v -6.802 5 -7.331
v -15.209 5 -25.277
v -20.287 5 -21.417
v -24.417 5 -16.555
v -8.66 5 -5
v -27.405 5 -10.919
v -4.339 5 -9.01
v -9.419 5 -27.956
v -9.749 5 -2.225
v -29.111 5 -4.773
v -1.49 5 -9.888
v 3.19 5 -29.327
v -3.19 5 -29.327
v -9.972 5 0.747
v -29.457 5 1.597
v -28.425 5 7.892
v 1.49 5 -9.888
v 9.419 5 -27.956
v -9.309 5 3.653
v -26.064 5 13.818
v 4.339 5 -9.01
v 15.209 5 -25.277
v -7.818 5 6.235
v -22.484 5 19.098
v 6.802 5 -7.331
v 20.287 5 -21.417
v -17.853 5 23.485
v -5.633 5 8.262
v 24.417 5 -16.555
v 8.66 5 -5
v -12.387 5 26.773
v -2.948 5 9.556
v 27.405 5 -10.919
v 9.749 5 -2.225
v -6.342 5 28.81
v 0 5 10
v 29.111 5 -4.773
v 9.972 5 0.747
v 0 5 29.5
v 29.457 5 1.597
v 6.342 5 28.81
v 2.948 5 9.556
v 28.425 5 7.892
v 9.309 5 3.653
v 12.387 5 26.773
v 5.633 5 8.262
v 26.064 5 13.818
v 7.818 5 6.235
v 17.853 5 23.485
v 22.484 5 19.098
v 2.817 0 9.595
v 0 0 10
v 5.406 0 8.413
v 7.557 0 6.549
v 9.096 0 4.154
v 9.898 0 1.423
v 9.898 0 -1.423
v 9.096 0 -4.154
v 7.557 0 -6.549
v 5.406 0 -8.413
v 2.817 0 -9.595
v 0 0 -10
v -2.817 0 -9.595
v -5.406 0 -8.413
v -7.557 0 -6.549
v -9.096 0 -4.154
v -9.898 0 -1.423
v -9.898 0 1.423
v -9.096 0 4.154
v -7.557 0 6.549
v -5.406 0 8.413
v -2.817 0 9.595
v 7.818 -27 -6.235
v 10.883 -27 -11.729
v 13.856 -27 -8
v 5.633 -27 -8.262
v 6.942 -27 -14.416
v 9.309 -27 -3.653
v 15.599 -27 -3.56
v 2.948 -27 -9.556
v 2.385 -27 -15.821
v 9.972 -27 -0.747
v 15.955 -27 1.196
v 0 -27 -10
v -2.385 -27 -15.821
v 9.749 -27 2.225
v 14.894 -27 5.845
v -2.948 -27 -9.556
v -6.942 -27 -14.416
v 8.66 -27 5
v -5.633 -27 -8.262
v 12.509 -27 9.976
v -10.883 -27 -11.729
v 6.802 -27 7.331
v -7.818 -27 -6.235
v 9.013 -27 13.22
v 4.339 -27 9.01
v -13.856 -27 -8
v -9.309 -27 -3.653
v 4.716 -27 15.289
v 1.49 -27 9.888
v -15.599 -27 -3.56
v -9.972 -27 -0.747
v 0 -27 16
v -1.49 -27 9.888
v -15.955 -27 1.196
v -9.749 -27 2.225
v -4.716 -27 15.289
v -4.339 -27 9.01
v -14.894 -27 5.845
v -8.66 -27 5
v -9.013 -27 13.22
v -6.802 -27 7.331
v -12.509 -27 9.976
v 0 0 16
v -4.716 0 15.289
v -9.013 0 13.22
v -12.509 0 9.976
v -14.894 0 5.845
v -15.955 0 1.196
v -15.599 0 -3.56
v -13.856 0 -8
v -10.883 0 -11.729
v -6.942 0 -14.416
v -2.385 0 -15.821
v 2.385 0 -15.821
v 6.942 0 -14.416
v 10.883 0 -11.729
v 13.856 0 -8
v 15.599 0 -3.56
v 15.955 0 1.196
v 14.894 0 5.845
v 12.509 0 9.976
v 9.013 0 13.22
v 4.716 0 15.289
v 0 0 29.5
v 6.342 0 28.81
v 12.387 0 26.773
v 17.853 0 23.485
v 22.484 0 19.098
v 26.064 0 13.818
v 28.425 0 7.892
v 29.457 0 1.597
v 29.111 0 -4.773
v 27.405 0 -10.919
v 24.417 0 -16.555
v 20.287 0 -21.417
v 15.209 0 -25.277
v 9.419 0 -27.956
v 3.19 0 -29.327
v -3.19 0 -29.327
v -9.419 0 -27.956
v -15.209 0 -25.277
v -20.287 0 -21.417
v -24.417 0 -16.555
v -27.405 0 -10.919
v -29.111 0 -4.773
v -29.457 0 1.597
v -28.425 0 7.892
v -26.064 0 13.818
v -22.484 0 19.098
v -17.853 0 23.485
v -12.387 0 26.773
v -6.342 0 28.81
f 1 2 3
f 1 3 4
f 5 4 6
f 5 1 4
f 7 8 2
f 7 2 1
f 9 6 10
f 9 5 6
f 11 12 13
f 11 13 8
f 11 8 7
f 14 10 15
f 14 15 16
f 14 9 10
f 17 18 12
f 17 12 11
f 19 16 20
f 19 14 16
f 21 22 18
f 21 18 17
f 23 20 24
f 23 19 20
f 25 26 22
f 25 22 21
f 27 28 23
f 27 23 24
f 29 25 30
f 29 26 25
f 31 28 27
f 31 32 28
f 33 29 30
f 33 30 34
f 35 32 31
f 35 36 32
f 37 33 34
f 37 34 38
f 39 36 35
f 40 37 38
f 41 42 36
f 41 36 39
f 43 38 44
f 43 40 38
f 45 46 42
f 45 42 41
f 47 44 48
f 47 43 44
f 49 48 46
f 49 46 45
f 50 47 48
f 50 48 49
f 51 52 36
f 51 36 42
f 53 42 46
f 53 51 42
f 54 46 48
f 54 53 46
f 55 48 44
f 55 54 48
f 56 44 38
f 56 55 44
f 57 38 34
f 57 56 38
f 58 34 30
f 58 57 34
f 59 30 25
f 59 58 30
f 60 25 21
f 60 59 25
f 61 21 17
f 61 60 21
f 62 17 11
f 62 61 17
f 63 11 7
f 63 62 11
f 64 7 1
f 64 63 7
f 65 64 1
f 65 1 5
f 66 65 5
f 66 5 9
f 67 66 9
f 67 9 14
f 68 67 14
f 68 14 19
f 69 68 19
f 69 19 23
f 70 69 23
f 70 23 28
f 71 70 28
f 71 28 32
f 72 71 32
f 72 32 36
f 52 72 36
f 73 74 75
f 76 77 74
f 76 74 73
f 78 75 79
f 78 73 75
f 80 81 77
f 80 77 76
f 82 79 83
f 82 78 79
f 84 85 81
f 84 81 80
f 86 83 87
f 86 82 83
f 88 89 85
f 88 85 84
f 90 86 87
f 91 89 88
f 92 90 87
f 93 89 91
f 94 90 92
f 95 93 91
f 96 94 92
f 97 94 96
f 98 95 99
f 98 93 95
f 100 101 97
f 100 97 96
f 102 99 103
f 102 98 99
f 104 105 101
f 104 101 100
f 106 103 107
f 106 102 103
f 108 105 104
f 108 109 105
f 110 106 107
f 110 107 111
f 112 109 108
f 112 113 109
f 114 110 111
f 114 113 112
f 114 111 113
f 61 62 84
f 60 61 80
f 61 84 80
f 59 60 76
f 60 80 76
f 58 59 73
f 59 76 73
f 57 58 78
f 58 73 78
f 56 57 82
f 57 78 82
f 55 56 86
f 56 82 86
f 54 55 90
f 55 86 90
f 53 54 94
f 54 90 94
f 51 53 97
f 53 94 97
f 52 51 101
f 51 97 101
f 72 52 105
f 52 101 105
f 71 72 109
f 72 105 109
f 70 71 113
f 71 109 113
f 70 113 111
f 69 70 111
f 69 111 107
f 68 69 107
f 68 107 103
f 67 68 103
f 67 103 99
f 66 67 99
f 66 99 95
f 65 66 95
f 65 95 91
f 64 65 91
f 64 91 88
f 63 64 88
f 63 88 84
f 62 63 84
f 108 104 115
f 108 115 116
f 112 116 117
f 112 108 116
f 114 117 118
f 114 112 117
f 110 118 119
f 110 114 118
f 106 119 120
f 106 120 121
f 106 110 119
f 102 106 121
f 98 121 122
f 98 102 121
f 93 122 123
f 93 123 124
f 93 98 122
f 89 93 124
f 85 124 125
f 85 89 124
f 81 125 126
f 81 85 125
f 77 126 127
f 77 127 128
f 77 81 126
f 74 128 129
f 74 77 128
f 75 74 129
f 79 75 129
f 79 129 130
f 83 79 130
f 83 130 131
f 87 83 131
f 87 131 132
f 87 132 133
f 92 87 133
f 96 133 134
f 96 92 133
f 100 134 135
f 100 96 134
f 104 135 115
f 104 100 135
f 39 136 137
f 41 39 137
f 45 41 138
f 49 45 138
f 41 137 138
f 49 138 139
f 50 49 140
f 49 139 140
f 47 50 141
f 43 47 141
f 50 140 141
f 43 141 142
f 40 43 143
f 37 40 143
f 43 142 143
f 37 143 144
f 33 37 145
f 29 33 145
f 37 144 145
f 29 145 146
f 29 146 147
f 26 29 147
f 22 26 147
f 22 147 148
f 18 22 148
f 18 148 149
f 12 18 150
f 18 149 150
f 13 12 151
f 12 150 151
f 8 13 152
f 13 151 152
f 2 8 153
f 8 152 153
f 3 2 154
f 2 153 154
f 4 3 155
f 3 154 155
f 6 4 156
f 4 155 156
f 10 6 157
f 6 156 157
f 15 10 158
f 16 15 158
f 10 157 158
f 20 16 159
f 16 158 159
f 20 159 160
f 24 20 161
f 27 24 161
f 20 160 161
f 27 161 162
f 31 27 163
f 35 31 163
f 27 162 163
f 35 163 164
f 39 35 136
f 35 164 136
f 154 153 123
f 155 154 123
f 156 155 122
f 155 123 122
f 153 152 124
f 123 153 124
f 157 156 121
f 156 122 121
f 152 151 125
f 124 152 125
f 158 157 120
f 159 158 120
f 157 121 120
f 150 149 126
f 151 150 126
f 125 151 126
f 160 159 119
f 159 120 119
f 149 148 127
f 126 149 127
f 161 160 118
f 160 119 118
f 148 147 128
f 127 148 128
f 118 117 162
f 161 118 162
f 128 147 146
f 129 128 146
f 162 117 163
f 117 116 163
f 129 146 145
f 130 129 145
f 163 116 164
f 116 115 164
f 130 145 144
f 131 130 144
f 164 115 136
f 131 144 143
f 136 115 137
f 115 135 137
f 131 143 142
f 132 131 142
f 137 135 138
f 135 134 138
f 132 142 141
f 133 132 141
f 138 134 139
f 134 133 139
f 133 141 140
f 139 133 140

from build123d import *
from build123d.topology import SkipClean

# Parameters (mm, degrees)
SKETCH1_R           = 29.5
SKETCH1_R_2         = 10
BOSS_EXTRUDE1_DEPTH = 5
BOSS_EXTRUDE2_START = 27
SKETCH2_R           = 16
SKETCH2_R_2         = 10
BOSS_EXTRUDE2_DEPTH = 27


with BuildPart() as part:
    # Sketch1 → Boss-Extrude1 (new body)
    with BuildSketch(Plane(origin=(0, 0, 0), x_dir=(1, 0, 0), z_dir=(0, 1, 0))):
        with Locations(Location((0, 0, 0), (0, 0, 270))):
            Circle(SKETCH1_R)
        with Locations(Location((0, 0, 0), (0, 0, 270))):
            Circle(SKETCH1_R_2, mode=Mode.SUBTRACT)
    extrude(amount=BOSS_EXTRUDE1_DEPTH)

    # Sketch2 → Boss-Extrude2 (add)
    with SkipClean():  # the faces are left unmerged after this step: merging them gives an invalid solid
        with BuildSketch(Plane(origin=(0, 0, 0), x_dir=(-1, 0, 0), z_dir=(0, -1, 0)).offset(BOSS_EXTRUDE2_START)):
            with Locations(Location((0, 0, 0), (0, 0, 270))):
                Circle(SKETCH2_R)
            with Locations(Location((0, 0, 0), (0, 0, 90))):
                Circle(SKETCH2_R_2, mode=Mode.SUBTRACT)
        extrude(amount=-BOSS_EXTRUDE2_DEPTH)


solid = part.part
